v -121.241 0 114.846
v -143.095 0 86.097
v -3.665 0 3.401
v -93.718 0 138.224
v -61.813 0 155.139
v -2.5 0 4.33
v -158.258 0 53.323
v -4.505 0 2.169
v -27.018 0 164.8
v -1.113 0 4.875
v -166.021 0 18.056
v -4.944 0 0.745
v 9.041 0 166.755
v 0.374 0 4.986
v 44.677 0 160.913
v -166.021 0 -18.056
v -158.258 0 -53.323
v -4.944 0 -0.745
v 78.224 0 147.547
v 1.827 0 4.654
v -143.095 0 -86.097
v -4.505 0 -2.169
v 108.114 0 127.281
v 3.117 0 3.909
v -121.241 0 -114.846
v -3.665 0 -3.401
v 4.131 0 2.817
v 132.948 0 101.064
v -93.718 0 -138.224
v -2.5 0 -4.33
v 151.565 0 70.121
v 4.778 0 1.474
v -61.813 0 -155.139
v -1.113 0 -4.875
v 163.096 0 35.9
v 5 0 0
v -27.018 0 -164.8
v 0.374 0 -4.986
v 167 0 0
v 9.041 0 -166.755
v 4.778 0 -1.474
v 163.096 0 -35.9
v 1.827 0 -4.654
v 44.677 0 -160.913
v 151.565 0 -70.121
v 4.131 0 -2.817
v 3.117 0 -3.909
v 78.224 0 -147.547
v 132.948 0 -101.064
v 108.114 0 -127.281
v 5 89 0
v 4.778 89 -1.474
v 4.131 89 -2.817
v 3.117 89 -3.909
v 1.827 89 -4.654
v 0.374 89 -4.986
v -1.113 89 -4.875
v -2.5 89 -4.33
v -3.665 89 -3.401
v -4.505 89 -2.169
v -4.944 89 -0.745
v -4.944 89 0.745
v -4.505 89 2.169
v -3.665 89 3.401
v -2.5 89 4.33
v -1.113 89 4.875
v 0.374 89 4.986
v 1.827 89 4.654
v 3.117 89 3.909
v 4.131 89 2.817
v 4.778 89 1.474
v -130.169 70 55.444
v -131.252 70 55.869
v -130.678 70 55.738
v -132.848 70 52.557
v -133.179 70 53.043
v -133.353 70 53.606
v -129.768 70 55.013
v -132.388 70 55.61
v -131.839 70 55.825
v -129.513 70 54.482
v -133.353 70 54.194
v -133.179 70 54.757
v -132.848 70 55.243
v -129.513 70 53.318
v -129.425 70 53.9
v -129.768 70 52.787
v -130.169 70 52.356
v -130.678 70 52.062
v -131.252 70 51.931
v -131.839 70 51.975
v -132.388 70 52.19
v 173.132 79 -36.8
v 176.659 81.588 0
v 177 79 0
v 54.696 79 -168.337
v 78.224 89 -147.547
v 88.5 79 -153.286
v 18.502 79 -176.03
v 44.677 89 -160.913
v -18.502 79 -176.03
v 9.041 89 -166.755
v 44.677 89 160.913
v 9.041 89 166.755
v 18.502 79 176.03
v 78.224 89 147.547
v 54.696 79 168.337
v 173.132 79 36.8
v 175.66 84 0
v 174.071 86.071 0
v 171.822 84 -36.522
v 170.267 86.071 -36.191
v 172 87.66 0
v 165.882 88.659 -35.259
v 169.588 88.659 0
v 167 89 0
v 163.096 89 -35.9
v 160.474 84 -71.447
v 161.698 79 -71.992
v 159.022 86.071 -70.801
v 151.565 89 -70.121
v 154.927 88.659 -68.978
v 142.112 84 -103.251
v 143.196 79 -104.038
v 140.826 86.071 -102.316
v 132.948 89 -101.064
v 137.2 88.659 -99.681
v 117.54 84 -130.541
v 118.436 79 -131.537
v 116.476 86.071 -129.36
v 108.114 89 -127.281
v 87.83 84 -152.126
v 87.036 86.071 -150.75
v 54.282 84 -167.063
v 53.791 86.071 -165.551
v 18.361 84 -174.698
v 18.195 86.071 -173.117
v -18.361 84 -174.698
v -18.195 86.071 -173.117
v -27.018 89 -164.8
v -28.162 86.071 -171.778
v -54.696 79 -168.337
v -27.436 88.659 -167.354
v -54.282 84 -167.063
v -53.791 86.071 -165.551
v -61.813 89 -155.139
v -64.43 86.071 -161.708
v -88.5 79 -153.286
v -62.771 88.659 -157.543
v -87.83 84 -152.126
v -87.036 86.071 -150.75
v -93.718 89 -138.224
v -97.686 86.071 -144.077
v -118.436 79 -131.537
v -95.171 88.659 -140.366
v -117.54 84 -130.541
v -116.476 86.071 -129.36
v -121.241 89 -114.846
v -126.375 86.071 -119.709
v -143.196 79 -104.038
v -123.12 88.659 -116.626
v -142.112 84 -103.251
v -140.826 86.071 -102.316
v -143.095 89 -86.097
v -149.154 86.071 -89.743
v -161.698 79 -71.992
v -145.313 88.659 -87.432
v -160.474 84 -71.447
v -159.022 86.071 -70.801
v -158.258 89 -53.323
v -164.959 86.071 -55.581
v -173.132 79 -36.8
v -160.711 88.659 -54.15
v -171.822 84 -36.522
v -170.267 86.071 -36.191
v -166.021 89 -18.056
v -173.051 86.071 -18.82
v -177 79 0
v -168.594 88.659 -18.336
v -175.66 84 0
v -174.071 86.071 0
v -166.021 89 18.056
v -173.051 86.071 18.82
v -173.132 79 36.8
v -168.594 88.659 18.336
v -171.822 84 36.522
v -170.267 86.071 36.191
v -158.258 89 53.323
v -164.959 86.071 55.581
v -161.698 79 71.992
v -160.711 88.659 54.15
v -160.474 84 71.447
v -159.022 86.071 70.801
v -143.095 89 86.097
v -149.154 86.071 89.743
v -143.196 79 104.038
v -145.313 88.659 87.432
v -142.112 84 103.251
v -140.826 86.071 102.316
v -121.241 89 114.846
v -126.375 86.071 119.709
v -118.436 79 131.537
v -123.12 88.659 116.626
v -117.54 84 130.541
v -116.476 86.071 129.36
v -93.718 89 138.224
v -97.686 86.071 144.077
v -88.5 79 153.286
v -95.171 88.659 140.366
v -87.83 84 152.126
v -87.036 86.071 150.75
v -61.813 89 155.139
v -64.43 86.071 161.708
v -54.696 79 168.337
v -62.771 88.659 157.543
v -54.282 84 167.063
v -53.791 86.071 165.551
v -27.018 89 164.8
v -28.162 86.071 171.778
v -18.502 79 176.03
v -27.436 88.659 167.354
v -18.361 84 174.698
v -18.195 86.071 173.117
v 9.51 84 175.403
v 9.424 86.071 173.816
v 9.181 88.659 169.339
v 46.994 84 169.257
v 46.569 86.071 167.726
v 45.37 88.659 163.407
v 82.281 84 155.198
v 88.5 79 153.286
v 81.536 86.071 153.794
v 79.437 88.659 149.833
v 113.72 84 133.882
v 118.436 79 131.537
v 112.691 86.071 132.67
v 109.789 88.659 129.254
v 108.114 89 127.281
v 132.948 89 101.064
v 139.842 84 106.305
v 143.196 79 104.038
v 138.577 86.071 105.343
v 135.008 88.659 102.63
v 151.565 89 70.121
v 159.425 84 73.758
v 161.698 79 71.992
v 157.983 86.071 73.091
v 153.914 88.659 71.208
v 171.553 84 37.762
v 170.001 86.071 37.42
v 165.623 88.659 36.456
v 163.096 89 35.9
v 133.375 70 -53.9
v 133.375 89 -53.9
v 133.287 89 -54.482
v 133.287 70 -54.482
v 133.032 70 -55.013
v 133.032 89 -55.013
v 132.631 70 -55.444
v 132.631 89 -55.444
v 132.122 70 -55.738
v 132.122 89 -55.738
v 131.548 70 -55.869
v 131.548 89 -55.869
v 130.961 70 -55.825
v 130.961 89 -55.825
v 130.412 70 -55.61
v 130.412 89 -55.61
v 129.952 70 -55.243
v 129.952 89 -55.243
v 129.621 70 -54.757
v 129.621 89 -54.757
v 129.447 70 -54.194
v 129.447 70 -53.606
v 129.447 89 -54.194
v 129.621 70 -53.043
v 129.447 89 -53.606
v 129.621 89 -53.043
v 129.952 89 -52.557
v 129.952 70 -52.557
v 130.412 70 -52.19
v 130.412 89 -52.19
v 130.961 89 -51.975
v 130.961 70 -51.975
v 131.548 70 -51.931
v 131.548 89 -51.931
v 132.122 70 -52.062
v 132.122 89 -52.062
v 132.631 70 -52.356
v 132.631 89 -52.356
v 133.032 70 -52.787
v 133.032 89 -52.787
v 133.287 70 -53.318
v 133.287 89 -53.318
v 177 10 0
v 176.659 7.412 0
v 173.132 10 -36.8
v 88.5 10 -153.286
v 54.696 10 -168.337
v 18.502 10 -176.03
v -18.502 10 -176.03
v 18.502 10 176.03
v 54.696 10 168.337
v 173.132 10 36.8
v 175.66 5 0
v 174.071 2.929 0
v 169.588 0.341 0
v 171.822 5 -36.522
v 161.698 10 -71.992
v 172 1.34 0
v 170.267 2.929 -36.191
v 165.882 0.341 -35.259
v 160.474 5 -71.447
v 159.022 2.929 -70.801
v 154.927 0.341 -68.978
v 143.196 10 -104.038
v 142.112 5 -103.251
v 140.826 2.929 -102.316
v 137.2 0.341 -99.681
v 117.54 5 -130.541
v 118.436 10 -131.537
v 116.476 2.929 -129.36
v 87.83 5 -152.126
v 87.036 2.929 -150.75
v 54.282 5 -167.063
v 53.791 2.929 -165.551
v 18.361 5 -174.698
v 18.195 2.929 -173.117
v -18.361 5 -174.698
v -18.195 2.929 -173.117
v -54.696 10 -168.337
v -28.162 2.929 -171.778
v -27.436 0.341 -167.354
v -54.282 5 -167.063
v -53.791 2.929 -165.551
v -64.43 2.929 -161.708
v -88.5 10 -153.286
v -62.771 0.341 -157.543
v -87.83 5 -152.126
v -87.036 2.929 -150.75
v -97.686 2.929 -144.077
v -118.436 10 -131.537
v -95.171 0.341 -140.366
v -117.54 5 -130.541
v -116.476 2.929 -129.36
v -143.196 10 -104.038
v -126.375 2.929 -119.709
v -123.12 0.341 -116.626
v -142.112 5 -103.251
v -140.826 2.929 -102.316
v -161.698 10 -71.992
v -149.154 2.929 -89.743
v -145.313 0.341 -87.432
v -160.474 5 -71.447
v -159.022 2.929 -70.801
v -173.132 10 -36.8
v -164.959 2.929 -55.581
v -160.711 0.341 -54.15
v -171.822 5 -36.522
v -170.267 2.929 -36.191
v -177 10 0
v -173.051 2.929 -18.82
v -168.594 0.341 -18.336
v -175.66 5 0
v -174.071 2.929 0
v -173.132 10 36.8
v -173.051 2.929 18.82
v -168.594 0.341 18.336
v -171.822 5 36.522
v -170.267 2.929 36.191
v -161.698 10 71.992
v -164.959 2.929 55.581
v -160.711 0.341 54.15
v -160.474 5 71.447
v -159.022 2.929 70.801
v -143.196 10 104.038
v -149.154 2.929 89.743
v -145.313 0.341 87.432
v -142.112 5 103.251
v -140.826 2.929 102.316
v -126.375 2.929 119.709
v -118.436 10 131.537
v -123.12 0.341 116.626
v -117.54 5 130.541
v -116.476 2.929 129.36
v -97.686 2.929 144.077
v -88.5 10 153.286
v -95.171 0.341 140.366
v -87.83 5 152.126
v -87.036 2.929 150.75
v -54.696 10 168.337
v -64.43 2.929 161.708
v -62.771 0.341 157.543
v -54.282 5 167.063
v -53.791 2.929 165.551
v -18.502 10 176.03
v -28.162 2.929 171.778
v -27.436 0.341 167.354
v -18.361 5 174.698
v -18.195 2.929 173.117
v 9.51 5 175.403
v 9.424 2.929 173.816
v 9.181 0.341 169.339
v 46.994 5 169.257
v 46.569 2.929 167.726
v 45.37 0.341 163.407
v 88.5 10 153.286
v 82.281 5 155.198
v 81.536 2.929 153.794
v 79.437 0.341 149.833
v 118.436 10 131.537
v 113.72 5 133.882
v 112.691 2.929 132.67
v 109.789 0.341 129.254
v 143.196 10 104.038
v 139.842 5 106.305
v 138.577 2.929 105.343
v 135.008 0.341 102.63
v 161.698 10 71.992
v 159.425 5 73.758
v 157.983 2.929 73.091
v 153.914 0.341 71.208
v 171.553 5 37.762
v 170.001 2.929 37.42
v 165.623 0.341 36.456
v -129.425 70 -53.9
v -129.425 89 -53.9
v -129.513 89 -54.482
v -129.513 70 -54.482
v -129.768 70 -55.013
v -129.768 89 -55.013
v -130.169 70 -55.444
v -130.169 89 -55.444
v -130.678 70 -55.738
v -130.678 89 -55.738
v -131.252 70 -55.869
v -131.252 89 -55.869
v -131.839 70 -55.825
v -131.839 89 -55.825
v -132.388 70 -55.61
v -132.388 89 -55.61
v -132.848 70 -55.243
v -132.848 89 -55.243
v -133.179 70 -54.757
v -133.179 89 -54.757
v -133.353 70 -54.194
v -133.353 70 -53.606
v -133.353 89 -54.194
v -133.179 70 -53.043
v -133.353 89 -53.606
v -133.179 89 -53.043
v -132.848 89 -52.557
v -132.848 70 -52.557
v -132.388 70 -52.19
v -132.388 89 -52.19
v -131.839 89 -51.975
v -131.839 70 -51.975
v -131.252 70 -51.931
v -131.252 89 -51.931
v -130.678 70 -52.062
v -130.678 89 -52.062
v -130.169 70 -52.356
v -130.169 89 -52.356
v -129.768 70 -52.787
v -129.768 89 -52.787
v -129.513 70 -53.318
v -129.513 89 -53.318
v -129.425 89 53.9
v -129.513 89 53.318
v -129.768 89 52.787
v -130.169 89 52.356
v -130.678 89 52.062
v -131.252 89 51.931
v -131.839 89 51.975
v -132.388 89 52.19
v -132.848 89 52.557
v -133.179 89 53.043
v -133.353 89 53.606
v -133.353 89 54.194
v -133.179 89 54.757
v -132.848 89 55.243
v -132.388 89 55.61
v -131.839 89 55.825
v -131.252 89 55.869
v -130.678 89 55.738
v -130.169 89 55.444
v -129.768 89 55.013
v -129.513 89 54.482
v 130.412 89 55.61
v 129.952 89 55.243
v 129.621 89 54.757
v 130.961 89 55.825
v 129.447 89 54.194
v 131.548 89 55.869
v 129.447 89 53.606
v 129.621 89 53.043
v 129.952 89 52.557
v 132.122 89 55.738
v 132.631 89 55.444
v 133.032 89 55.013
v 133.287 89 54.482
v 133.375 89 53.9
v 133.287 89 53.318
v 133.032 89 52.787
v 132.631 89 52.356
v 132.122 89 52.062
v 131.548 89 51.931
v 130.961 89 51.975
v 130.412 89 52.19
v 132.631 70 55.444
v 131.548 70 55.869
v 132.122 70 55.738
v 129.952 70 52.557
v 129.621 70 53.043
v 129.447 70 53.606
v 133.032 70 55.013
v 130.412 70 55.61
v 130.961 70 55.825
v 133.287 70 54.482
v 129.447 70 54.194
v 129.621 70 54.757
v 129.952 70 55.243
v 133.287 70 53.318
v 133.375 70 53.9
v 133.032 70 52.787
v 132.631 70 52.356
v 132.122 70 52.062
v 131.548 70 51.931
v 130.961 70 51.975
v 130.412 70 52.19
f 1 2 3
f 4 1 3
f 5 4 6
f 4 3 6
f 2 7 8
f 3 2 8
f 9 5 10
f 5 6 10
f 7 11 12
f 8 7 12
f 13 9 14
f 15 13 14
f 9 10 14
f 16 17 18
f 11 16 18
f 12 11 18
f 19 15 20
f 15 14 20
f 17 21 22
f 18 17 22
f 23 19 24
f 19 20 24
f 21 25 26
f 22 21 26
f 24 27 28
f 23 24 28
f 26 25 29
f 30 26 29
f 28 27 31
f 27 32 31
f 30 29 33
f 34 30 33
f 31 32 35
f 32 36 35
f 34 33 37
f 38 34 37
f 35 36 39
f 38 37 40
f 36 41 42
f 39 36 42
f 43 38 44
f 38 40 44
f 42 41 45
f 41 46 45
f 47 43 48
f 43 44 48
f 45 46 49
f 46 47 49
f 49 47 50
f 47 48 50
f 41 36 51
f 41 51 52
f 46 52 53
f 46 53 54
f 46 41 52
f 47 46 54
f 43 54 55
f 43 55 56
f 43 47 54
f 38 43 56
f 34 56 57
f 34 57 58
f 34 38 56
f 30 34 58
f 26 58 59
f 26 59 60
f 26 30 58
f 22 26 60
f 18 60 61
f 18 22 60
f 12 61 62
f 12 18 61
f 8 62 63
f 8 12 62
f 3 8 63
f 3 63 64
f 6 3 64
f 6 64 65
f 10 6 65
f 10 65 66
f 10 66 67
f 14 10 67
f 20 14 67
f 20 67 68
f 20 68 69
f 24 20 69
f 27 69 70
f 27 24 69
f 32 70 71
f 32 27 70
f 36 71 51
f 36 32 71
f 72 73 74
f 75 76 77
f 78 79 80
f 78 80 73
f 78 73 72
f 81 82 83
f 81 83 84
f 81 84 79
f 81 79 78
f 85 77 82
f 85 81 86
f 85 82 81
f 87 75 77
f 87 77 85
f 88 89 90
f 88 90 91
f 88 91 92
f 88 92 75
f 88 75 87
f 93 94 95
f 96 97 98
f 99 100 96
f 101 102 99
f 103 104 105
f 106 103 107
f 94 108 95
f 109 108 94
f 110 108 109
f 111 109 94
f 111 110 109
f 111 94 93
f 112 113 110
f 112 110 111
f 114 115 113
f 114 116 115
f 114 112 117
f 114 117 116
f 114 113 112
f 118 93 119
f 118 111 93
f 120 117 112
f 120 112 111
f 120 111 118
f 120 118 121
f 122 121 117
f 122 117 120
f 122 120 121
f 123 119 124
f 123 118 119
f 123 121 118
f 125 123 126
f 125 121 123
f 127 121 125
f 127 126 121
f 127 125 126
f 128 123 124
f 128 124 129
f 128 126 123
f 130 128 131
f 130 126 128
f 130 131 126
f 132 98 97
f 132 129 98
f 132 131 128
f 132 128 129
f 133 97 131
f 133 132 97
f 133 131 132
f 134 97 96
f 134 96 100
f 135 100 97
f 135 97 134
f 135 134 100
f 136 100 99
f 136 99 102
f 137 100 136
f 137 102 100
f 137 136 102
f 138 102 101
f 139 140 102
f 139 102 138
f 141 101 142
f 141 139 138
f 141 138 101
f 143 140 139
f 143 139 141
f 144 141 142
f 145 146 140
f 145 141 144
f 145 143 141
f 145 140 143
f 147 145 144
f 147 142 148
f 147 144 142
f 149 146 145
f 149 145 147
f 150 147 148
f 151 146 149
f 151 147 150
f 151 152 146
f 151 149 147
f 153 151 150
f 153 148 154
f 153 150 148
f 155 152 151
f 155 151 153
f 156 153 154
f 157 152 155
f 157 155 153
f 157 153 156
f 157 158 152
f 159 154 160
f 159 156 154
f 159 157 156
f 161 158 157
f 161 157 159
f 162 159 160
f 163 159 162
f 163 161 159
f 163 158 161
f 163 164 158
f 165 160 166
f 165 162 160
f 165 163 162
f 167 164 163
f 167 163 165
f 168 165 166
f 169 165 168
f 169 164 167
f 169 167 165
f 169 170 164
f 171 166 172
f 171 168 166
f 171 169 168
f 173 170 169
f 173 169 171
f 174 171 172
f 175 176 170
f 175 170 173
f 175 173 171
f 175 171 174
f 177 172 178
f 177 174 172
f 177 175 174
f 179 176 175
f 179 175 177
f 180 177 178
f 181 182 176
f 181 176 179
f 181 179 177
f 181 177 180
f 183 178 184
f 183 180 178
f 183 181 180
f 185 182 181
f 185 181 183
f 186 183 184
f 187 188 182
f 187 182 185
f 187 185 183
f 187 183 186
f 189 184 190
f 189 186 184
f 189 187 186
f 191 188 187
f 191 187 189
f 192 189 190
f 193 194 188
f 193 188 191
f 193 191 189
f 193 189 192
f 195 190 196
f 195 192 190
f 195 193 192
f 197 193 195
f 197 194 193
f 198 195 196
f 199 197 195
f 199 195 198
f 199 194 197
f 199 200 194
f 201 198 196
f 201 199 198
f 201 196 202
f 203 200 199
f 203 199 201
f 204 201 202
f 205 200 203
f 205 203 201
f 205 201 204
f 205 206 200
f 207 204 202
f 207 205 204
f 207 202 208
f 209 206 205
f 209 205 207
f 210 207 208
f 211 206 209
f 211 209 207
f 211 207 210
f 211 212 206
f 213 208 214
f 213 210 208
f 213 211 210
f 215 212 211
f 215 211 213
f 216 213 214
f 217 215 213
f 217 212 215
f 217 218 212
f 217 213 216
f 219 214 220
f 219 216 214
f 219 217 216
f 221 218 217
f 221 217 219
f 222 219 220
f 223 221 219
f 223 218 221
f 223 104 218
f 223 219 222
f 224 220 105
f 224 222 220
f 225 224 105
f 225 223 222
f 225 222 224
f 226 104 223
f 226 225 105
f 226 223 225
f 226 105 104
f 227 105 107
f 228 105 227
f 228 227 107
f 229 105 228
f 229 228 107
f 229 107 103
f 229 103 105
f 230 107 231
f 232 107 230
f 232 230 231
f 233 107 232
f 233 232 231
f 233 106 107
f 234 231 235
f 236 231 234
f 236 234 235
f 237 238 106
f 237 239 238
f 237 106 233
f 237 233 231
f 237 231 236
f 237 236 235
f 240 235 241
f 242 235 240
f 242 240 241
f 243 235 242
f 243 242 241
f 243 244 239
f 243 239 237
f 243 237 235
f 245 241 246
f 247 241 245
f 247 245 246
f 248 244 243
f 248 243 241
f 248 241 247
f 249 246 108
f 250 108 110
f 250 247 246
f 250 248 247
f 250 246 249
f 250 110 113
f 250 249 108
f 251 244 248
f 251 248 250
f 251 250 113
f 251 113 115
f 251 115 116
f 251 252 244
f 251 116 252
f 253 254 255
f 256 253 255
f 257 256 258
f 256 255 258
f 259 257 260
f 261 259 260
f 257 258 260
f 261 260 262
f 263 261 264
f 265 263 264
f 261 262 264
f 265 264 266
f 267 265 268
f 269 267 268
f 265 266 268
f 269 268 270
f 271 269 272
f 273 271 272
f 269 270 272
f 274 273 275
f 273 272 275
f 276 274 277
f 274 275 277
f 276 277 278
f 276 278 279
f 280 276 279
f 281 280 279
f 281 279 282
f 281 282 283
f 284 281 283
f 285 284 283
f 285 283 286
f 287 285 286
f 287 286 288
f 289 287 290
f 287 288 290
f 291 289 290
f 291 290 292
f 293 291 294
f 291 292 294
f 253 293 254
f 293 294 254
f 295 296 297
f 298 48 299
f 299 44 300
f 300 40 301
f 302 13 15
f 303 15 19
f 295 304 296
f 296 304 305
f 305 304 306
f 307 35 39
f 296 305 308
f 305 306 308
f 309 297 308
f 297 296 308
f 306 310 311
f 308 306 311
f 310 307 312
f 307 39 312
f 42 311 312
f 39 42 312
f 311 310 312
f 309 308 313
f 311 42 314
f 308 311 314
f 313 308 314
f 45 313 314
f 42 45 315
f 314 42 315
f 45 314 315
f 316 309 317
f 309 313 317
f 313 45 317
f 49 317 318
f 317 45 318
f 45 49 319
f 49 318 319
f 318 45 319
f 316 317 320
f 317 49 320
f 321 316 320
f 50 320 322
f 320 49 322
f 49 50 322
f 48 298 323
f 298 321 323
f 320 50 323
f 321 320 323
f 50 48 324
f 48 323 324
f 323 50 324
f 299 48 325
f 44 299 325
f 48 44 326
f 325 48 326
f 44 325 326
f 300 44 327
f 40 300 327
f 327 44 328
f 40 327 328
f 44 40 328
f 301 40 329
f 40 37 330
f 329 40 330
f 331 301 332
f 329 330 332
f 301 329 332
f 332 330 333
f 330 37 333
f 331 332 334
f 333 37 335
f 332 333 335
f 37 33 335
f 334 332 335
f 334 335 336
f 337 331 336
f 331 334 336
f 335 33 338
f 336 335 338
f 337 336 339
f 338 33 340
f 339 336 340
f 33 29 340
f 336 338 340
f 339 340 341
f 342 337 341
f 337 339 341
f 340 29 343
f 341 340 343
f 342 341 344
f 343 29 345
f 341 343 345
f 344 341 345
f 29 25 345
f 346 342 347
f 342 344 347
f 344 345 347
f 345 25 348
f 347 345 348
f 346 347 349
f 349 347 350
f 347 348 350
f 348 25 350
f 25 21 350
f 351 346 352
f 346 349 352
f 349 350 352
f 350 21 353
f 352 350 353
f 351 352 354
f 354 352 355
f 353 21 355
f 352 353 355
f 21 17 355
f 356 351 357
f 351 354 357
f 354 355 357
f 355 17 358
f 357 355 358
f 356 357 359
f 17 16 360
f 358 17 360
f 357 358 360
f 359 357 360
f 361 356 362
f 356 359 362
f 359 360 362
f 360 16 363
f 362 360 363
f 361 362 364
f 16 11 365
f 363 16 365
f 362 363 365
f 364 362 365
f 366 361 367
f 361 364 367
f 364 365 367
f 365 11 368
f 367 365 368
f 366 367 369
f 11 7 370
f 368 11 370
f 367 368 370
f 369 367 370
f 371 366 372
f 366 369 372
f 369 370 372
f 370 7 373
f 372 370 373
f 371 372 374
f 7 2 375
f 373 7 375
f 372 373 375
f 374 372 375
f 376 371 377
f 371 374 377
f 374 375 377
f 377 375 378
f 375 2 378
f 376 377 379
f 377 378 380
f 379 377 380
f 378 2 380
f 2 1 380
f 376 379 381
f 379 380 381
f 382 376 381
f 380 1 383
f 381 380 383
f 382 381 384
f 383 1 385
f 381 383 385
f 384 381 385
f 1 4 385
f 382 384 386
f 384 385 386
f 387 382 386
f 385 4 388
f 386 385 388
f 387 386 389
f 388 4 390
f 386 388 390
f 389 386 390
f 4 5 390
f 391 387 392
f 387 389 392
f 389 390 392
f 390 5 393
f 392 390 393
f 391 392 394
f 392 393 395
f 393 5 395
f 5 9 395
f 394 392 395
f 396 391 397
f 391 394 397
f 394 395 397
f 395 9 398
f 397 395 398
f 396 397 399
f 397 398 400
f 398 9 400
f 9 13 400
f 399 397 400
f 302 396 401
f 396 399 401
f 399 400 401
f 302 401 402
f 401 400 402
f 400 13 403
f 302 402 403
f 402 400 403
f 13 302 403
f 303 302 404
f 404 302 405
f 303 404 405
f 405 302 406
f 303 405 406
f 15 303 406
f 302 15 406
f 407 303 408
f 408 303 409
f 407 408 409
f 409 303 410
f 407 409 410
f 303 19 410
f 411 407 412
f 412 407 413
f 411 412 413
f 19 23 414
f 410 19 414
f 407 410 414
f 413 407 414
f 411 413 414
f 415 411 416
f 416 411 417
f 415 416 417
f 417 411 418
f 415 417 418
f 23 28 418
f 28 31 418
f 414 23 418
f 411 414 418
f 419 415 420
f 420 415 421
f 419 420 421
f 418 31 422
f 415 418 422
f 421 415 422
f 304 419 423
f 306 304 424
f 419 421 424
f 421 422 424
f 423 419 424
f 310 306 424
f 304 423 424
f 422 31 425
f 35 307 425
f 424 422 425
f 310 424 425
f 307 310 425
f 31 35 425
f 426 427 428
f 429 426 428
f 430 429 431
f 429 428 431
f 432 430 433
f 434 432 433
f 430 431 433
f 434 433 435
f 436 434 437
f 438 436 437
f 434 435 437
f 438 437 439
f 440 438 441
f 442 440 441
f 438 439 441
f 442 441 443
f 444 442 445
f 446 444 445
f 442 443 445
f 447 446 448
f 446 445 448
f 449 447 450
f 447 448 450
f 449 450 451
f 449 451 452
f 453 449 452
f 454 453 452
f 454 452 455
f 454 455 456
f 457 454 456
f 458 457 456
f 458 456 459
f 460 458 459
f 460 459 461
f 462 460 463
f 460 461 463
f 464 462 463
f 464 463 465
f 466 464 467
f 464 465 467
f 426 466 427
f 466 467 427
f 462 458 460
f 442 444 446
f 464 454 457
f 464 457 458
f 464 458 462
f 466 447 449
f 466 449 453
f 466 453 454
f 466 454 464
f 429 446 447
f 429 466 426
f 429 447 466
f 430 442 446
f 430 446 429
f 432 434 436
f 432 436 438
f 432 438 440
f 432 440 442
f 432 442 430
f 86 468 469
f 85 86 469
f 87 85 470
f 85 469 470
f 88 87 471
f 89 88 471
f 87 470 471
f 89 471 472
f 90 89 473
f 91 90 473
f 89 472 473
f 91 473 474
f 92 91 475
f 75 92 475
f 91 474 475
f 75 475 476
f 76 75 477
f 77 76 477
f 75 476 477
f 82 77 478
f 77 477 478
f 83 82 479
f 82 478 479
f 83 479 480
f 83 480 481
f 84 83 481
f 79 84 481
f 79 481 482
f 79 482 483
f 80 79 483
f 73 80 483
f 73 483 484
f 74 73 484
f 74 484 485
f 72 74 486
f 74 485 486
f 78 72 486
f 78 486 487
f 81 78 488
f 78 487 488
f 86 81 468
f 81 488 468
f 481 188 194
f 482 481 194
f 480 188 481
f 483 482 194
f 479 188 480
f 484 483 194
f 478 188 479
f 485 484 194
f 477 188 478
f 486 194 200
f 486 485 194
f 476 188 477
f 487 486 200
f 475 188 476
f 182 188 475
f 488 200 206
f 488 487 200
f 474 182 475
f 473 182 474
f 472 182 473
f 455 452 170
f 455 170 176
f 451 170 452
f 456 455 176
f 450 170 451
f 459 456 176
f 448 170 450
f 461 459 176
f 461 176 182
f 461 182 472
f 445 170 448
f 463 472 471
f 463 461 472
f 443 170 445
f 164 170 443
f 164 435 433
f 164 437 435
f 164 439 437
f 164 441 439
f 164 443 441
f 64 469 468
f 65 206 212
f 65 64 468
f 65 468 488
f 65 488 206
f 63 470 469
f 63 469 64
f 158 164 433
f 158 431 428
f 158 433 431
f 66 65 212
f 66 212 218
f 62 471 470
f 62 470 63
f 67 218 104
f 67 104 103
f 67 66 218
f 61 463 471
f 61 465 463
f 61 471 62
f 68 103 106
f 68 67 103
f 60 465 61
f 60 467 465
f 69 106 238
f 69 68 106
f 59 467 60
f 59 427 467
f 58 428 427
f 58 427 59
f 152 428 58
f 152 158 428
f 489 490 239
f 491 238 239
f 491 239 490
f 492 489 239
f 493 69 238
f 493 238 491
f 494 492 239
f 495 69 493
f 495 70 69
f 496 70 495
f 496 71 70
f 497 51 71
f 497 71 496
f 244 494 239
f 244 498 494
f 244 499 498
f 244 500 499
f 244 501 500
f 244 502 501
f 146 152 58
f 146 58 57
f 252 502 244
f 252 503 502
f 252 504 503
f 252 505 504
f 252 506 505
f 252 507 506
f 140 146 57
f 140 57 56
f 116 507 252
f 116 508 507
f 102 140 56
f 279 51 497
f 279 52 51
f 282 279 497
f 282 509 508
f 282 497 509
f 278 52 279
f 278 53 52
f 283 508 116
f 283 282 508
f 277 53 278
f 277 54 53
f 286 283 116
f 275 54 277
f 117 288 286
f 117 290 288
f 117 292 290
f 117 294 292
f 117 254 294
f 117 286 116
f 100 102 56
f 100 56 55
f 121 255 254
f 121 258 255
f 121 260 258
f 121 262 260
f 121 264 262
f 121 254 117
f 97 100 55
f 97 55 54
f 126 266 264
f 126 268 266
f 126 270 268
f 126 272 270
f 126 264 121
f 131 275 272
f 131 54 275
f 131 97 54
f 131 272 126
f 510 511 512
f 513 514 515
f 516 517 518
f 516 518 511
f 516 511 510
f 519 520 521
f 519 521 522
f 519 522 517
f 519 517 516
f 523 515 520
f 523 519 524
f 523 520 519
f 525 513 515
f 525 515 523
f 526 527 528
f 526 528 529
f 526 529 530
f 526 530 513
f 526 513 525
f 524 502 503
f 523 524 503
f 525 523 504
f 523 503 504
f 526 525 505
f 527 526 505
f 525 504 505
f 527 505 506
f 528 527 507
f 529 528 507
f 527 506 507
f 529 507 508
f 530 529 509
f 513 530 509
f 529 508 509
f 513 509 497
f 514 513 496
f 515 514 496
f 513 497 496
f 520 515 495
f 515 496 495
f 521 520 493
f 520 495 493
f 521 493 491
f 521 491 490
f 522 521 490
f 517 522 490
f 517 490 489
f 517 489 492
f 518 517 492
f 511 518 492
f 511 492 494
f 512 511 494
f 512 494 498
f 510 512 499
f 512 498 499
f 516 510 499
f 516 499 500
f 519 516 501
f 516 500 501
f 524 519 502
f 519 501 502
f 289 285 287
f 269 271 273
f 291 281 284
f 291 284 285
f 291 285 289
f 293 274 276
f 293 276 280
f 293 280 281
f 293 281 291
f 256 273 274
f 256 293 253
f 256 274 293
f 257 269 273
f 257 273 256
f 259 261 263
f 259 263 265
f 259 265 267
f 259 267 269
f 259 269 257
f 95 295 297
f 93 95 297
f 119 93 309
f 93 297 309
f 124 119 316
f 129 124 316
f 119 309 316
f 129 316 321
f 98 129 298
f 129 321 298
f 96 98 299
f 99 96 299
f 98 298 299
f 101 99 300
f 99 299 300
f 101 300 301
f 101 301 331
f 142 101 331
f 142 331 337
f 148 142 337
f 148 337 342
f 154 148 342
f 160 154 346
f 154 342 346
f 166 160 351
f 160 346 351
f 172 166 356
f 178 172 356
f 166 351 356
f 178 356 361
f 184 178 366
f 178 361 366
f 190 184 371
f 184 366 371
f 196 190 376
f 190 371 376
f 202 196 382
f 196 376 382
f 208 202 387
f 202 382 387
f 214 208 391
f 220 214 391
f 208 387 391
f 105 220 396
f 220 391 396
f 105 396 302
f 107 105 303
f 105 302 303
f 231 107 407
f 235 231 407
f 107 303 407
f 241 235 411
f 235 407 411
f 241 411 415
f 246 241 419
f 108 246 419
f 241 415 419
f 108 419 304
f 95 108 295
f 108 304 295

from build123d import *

# Parameters (mm, degrees)
SKETCH1_R           = 177
SKETCH1_R_2         = 5
BOSS_EXTRUDE1_DEPTH = 89
SKETCH2_R           = 1.975
CUT_EXTRUDE1_DEPTH  = 19
FILLET1_R           = 10


with BuildPart() as part:
    # Sketch1 → Boss-Extrude1 (new body)
    with BuildSketch(Plane(origin=(0, 0, 0), x_dir=(1, 0, 0), z_dir=(0, 1, 0))):
        Circle(SKETCH1_R)
        Circle(SKETCH1_R_2, mode=Mode.SUBTRACT)
    extrude(amount=BOSS_EXTRUDE1_DEPTH)

    # Sketch2 → Cut-Extrude1 (cut)
    with BuildSketch(Plane(origin=(0, 89, 0), x_dir=(1, 0, 0), z_dir=(0, 1, 0))):
        with Locations((-131.4, 53.9)):
            Circle(SKETCH2_R)
        with Locations((-131.4, -53.9)):
            Circle(SKETCH2_R)
        with Locations((131.4, -53.9)):
            Circle(SKETCH2_R)
        with Locations((131.4, 53.9)):
            Circle(SKETCH2_R)
    extrude(amount=-CUT_EXTRUDE1_DEPTH, mode=Mode.SUBTRACT)

    # Fillet1
    fillet1_edges = [part.edges().sort_by_distance(p)[0] for p in [
        (-177, 0, 0),
        (-177, 89, 0),
    ]]
    fillet(fillet1_edges, radius=FILLET1_R)


solid = part.part
